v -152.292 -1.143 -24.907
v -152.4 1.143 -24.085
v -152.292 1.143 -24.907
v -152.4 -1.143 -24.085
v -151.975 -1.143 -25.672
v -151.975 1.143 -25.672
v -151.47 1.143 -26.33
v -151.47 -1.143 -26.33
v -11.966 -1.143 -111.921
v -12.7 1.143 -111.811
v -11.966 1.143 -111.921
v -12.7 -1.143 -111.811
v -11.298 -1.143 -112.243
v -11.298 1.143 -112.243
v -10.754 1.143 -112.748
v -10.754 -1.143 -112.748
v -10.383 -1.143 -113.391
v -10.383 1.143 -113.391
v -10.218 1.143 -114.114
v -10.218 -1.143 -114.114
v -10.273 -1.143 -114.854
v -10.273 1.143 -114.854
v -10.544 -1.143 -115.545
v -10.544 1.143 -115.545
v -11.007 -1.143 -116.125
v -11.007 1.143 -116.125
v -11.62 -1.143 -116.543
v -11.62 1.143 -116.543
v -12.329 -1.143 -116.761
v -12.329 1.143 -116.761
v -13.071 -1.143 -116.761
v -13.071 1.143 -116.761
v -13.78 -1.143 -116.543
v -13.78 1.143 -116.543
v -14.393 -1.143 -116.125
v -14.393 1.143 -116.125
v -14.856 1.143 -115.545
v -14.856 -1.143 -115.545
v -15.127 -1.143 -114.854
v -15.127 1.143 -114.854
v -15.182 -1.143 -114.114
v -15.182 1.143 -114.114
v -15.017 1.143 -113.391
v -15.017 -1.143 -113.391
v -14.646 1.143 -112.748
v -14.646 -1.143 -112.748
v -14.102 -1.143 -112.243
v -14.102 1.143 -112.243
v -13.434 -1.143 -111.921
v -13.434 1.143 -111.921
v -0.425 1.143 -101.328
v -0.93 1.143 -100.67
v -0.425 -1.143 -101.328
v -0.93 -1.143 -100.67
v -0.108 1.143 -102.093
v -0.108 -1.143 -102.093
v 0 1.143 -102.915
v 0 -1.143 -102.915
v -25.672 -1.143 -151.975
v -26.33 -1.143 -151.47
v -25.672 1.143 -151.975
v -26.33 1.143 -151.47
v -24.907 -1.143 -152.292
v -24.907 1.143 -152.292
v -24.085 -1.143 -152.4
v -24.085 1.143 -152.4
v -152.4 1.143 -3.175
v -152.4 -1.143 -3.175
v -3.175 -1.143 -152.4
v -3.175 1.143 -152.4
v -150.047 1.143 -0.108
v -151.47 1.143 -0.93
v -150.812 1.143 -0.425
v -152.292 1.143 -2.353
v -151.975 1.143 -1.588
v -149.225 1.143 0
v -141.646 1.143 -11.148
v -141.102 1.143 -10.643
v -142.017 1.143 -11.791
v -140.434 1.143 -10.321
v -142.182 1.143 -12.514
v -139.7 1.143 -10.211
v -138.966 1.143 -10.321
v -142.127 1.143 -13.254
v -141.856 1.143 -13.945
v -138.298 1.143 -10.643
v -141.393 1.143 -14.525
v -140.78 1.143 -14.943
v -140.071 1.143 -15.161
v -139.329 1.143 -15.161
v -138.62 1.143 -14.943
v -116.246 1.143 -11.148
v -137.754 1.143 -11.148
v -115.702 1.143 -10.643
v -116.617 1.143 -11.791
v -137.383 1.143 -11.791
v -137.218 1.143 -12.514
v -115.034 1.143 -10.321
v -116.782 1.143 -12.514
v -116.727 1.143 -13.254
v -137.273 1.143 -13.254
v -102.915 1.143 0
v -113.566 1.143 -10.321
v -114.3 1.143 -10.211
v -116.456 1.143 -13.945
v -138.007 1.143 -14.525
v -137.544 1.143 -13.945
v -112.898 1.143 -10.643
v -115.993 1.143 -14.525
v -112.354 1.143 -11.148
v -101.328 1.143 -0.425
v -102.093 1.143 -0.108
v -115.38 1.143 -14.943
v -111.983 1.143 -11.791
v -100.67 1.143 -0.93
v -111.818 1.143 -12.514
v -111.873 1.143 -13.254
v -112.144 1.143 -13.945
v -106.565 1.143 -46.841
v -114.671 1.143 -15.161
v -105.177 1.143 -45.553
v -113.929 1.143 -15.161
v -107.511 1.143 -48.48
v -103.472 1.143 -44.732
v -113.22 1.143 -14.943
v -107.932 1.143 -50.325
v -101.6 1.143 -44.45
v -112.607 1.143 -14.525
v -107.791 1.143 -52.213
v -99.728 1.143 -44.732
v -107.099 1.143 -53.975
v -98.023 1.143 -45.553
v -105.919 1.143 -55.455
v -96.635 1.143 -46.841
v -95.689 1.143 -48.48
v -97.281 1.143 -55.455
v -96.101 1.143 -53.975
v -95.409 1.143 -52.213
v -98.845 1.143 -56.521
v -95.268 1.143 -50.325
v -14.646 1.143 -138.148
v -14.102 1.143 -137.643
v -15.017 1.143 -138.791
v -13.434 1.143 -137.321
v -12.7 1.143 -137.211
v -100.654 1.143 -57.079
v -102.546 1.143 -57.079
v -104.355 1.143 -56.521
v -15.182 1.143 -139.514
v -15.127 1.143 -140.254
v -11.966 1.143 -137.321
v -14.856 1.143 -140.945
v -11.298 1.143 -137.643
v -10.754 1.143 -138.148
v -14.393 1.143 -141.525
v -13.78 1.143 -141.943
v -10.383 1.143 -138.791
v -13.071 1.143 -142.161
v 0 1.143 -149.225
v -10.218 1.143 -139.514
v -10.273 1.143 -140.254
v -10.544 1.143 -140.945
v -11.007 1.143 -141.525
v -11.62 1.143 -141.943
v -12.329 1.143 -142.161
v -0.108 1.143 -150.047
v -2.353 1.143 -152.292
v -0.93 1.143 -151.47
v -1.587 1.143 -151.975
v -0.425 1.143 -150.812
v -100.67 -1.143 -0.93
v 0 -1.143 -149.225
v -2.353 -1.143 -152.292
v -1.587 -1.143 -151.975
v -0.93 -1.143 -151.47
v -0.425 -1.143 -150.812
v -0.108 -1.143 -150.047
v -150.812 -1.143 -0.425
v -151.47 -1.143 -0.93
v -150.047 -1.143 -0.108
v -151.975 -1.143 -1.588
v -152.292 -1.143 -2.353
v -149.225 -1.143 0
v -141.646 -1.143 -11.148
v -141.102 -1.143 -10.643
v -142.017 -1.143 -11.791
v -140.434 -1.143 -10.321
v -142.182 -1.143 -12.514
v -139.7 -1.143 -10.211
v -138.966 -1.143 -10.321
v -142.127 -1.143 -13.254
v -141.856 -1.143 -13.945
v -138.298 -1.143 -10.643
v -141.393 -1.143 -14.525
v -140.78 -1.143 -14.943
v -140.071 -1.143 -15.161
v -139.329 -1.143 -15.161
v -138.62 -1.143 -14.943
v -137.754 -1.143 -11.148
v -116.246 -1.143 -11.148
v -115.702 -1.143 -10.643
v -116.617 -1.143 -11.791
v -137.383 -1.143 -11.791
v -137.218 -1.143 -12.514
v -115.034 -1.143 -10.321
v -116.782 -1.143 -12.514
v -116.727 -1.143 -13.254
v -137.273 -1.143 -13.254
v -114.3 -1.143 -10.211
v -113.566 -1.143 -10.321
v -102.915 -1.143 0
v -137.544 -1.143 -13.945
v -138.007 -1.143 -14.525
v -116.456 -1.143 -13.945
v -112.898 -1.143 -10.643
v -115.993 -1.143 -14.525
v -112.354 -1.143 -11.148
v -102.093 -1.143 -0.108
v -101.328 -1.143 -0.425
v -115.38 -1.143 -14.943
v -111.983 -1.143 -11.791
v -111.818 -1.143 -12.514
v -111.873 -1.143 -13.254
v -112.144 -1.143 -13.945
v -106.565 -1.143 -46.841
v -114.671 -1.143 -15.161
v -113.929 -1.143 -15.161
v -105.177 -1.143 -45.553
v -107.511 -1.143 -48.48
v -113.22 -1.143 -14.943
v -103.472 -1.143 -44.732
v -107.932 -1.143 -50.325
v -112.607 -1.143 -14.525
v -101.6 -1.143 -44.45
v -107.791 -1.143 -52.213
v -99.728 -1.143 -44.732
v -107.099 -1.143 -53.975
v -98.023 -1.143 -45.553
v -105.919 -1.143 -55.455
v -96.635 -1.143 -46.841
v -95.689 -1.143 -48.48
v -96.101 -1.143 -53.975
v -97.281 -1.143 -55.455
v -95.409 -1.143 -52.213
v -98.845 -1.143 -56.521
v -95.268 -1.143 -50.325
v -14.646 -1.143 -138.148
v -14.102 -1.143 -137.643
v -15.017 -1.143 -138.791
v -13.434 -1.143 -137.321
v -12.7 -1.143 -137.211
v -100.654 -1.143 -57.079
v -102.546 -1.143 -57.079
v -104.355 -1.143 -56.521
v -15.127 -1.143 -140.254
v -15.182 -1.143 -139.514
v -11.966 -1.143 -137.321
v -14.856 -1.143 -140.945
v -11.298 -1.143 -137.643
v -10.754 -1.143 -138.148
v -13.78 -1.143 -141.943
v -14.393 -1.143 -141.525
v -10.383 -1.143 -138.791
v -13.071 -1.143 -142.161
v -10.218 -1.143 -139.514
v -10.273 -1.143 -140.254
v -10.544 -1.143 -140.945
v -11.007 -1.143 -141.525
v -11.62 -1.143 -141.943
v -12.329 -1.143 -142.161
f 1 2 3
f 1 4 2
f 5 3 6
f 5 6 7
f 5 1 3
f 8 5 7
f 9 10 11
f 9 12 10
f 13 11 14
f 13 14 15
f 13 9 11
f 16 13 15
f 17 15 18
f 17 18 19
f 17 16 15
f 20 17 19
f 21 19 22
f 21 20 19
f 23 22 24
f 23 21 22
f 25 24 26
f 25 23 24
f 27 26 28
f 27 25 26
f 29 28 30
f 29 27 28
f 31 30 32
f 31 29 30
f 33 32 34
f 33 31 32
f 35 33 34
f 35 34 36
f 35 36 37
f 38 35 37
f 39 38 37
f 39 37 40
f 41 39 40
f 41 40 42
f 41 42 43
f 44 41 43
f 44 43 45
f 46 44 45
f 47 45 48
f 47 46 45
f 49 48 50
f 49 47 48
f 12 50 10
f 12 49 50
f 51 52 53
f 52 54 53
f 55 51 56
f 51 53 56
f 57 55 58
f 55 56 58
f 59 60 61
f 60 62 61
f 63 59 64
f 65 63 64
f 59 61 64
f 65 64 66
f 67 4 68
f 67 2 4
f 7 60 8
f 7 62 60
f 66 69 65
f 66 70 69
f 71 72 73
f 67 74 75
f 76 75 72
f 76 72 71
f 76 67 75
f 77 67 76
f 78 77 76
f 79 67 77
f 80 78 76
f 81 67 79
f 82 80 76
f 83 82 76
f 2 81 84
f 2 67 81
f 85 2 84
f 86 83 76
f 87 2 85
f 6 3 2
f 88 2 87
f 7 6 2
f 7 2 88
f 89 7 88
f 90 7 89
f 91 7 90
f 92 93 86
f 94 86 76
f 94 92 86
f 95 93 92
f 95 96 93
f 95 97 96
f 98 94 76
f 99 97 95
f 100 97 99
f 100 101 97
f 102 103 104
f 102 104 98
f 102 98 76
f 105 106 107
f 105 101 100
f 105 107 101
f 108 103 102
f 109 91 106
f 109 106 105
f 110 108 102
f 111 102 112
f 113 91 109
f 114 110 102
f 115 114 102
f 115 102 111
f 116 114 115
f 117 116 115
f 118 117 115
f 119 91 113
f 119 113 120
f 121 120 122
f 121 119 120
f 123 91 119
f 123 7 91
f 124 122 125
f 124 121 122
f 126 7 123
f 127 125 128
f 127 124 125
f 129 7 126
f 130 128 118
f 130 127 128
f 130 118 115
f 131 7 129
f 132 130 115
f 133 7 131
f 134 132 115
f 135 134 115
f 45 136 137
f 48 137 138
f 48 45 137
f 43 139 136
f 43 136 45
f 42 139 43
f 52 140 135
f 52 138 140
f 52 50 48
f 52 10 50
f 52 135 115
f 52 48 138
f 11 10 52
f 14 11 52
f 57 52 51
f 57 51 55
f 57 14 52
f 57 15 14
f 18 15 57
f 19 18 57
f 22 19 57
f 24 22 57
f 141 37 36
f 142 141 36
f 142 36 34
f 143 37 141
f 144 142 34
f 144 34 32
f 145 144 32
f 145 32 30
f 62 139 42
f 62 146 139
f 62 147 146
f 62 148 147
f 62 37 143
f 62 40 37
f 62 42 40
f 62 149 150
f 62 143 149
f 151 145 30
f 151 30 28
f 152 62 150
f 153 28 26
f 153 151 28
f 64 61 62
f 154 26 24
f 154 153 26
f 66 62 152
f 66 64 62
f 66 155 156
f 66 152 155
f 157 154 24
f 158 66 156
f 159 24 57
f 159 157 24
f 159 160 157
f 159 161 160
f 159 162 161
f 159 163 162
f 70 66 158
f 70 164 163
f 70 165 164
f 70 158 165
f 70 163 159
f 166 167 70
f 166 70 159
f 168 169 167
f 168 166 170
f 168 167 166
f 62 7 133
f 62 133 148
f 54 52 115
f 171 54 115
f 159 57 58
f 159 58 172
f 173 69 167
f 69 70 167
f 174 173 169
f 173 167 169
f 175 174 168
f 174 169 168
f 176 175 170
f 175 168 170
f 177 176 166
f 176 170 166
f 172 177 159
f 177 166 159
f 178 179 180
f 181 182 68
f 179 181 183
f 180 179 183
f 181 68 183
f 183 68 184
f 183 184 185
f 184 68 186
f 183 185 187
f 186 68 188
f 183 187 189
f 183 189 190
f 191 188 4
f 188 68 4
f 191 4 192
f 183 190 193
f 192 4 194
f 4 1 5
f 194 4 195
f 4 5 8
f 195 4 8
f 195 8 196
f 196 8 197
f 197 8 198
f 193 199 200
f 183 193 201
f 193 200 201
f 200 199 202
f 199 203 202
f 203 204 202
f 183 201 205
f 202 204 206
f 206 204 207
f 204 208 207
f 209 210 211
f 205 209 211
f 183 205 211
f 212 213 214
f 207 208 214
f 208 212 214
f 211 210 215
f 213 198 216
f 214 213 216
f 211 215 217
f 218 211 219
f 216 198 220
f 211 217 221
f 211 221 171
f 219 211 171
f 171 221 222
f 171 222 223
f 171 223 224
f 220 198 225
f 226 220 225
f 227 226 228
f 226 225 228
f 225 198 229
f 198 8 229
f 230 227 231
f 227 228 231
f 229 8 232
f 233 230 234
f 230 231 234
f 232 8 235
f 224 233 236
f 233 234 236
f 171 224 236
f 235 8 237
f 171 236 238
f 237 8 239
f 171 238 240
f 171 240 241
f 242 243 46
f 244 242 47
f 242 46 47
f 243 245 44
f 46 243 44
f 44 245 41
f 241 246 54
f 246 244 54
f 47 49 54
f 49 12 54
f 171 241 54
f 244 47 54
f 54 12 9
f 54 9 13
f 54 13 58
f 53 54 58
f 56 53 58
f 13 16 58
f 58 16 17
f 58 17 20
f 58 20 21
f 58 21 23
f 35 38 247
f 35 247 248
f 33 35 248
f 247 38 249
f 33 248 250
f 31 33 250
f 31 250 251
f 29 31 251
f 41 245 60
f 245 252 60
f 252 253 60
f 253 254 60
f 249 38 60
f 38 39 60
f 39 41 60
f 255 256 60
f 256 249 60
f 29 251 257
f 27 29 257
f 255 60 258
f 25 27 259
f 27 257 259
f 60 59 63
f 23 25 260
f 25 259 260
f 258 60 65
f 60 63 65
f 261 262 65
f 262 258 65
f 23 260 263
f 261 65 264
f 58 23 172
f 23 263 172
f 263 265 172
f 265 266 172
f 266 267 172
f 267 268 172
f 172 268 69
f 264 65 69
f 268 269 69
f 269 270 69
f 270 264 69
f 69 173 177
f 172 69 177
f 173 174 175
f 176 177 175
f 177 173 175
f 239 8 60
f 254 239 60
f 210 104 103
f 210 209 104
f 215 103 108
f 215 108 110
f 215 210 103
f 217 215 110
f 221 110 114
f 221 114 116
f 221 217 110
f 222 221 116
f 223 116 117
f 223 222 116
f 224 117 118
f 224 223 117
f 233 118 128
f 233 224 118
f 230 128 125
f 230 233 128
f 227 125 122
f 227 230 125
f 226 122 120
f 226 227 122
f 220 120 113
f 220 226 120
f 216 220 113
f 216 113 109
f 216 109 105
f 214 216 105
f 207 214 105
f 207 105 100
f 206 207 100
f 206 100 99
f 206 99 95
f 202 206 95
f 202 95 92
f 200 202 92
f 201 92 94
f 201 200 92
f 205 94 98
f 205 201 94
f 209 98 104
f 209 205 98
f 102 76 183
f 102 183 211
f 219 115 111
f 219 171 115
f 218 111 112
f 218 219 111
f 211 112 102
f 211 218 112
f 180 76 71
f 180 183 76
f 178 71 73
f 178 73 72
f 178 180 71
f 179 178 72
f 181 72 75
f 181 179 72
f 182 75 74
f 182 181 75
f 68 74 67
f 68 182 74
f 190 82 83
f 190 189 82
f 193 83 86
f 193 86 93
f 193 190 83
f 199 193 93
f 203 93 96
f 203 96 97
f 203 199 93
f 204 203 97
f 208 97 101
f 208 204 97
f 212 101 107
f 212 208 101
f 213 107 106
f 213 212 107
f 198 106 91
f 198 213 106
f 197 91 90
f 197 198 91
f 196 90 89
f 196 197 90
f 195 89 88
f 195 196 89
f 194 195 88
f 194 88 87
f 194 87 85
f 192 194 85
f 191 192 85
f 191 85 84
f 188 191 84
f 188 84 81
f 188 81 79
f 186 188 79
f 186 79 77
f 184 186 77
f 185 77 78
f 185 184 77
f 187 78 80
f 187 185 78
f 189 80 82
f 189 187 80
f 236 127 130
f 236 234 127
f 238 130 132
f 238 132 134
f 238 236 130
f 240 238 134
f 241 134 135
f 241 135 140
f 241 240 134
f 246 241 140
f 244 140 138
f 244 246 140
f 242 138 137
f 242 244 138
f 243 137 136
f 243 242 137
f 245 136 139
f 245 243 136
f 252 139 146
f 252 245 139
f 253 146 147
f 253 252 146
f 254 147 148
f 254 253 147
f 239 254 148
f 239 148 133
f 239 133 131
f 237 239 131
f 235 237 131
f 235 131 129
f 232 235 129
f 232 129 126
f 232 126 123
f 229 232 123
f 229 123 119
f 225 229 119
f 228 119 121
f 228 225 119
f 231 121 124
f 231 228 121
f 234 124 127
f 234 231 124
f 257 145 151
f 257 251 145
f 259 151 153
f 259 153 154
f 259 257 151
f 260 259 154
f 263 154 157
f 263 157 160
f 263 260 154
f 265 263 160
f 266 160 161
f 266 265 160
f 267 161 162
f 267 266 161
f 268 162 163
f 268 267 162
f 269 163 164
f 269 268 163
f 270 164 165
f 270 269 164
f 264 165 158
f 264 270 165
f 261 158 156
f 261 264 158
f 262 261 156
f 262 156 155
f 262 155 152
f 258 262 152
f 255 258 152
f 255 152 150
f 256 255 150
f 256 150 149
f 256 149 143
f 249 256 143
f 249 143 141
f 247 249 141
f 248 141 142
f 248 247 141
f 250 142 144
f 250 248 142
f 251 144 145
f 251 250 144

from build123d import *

# Parameters (mm, degrees)
SKETCH1_R           = 2.4892
SKETCH1_R_2         = 6.35
BOSS_EXTRUDE2_DEPTH = 1.143
CUT_EXTRUDE1_DEPTH  = 216.53826991
BOSS_EXTRUDE3_DEPTH = 2.286
FILLET3_R           = 3.175


with BuildPart() as part:
    # Sketch1 → Boss-Extrude2 (new, symmetric)
    with BuildSketch(Plane(origin=(0, 0, 0), x_dir=(1, 0, 0), z_dir=(0, 1, 0))):
        Polygon((0, 0), (0, 152.4), (-25.4, 152.4), (-152.4, 25.4), (-152.4, 0), align=None)
        with Locations(Location((-12.7, 12.7, 0), (0, 0, 270))):
            Circle(SKETCH1_R, mode=Mode.SUBTRACT)
        with Locations(Location((-38.1, 12.7, 0), (0, 0, 270))):
            Circle(SKETCH1_R, mode=Mode.SUBTRACT)
        with Locations(Location((-63.5, 12.7, 0), (0, 0, 270))):
            Circle(SKETCH1_R, mode=Mode.SUBTRACT)
        with Locations(Location((-88.9, 12.7, 0), (0, 0, 270))):
            Circle(SKETCH1_R, mode=Mode.SUBTRACT)
        with Locations(Location((-114.3, 12.7, 0), (0, 0, 270))):
            Circle(SKETCH1_R, mode=Mode.SUBTRACT)
        with Locations(Location((-12.7, 38.1, 0), (0, 0, 270))):
            Circle(SKETCH1_R, mode=Mode.SUBTRACT)
        with Locations(Location((-12.7, 63.5, 0), (0, 0, 270))):
            Circle(SKETCH1_R, mode=Mode.SUBTRACT)
        with Locations(Location((-12.7, 88.9, 0), (0, 0, 270))):
            Circle(SKETCH1_R, mode=Mode.SUBTRACT)
        with Locations(Location((-12.7, 114.3, 0), (0, 0, 270))):
            Circle(SKETCH1_R, mode=Mode.SUBTRACT)
        with Locations(Location((-139.7, 12.7, 0), (0, 0, 270))):
            Circle(SKETCH1_R, mode=Mode.SUBTRACT)
        with Locations(Location((-12.7, 139.7, 0), (0, 0, 270))):
            Circle(SKETCH1_R, mode=Mode.SUBTRACT)
        with Locations(Location((-101.6, 50.8, 0), (0, 0, 270))):
            Circle(SKETCH1_R_2, mode=Mode.SUBTRACT)
    extrude(amount=BOSS_EXTRUDE2_DEPTH, both=True)

    # Sketch2 → Cut-Extrude1 (cut, through all)
    with BuildSketch(Plane(origin=(0, 1.143, 0), x_dir=(1, 0, 0), z_dir=(0, 1, 0))):
        Polygon((0, 0), (0, 101.6), (-101.6, 0), align=None)
    extrude(amount=-CUT_EXTRUDE1_DEPTH, mode=Mode.SUBTRACT)

    # Sketch3 → Boss-Extrude3 (add)
    with BuildSketch(Plane(origin=(0, 1.143, 0), x_dir=(1, 0, 0), z_dir=(0, 1, 0))):
        Polygon((-101.6, 0), (-101.6, 15.120409187), (-15.612291765, 101.108117422), (0, 101.6), align=None)
    extrude(amount=-BOSS_EXTRUDE3_DEPTH)

    # Fillet3
    fillet3_edges = [part.edges().sort_by_distance(p)[0] for p in [
        (-101.6, 0, 0),
        (0, 0, -101.6),
        (-152.4, 0, 0),
        (-152.4, 0, -25.4),
        (-25.4, 0, -152.4),
        (0, 0, -152.4),
    ]]
    fillet(fillet3_edges, radius=FILLET3_R)


solid = part.part
